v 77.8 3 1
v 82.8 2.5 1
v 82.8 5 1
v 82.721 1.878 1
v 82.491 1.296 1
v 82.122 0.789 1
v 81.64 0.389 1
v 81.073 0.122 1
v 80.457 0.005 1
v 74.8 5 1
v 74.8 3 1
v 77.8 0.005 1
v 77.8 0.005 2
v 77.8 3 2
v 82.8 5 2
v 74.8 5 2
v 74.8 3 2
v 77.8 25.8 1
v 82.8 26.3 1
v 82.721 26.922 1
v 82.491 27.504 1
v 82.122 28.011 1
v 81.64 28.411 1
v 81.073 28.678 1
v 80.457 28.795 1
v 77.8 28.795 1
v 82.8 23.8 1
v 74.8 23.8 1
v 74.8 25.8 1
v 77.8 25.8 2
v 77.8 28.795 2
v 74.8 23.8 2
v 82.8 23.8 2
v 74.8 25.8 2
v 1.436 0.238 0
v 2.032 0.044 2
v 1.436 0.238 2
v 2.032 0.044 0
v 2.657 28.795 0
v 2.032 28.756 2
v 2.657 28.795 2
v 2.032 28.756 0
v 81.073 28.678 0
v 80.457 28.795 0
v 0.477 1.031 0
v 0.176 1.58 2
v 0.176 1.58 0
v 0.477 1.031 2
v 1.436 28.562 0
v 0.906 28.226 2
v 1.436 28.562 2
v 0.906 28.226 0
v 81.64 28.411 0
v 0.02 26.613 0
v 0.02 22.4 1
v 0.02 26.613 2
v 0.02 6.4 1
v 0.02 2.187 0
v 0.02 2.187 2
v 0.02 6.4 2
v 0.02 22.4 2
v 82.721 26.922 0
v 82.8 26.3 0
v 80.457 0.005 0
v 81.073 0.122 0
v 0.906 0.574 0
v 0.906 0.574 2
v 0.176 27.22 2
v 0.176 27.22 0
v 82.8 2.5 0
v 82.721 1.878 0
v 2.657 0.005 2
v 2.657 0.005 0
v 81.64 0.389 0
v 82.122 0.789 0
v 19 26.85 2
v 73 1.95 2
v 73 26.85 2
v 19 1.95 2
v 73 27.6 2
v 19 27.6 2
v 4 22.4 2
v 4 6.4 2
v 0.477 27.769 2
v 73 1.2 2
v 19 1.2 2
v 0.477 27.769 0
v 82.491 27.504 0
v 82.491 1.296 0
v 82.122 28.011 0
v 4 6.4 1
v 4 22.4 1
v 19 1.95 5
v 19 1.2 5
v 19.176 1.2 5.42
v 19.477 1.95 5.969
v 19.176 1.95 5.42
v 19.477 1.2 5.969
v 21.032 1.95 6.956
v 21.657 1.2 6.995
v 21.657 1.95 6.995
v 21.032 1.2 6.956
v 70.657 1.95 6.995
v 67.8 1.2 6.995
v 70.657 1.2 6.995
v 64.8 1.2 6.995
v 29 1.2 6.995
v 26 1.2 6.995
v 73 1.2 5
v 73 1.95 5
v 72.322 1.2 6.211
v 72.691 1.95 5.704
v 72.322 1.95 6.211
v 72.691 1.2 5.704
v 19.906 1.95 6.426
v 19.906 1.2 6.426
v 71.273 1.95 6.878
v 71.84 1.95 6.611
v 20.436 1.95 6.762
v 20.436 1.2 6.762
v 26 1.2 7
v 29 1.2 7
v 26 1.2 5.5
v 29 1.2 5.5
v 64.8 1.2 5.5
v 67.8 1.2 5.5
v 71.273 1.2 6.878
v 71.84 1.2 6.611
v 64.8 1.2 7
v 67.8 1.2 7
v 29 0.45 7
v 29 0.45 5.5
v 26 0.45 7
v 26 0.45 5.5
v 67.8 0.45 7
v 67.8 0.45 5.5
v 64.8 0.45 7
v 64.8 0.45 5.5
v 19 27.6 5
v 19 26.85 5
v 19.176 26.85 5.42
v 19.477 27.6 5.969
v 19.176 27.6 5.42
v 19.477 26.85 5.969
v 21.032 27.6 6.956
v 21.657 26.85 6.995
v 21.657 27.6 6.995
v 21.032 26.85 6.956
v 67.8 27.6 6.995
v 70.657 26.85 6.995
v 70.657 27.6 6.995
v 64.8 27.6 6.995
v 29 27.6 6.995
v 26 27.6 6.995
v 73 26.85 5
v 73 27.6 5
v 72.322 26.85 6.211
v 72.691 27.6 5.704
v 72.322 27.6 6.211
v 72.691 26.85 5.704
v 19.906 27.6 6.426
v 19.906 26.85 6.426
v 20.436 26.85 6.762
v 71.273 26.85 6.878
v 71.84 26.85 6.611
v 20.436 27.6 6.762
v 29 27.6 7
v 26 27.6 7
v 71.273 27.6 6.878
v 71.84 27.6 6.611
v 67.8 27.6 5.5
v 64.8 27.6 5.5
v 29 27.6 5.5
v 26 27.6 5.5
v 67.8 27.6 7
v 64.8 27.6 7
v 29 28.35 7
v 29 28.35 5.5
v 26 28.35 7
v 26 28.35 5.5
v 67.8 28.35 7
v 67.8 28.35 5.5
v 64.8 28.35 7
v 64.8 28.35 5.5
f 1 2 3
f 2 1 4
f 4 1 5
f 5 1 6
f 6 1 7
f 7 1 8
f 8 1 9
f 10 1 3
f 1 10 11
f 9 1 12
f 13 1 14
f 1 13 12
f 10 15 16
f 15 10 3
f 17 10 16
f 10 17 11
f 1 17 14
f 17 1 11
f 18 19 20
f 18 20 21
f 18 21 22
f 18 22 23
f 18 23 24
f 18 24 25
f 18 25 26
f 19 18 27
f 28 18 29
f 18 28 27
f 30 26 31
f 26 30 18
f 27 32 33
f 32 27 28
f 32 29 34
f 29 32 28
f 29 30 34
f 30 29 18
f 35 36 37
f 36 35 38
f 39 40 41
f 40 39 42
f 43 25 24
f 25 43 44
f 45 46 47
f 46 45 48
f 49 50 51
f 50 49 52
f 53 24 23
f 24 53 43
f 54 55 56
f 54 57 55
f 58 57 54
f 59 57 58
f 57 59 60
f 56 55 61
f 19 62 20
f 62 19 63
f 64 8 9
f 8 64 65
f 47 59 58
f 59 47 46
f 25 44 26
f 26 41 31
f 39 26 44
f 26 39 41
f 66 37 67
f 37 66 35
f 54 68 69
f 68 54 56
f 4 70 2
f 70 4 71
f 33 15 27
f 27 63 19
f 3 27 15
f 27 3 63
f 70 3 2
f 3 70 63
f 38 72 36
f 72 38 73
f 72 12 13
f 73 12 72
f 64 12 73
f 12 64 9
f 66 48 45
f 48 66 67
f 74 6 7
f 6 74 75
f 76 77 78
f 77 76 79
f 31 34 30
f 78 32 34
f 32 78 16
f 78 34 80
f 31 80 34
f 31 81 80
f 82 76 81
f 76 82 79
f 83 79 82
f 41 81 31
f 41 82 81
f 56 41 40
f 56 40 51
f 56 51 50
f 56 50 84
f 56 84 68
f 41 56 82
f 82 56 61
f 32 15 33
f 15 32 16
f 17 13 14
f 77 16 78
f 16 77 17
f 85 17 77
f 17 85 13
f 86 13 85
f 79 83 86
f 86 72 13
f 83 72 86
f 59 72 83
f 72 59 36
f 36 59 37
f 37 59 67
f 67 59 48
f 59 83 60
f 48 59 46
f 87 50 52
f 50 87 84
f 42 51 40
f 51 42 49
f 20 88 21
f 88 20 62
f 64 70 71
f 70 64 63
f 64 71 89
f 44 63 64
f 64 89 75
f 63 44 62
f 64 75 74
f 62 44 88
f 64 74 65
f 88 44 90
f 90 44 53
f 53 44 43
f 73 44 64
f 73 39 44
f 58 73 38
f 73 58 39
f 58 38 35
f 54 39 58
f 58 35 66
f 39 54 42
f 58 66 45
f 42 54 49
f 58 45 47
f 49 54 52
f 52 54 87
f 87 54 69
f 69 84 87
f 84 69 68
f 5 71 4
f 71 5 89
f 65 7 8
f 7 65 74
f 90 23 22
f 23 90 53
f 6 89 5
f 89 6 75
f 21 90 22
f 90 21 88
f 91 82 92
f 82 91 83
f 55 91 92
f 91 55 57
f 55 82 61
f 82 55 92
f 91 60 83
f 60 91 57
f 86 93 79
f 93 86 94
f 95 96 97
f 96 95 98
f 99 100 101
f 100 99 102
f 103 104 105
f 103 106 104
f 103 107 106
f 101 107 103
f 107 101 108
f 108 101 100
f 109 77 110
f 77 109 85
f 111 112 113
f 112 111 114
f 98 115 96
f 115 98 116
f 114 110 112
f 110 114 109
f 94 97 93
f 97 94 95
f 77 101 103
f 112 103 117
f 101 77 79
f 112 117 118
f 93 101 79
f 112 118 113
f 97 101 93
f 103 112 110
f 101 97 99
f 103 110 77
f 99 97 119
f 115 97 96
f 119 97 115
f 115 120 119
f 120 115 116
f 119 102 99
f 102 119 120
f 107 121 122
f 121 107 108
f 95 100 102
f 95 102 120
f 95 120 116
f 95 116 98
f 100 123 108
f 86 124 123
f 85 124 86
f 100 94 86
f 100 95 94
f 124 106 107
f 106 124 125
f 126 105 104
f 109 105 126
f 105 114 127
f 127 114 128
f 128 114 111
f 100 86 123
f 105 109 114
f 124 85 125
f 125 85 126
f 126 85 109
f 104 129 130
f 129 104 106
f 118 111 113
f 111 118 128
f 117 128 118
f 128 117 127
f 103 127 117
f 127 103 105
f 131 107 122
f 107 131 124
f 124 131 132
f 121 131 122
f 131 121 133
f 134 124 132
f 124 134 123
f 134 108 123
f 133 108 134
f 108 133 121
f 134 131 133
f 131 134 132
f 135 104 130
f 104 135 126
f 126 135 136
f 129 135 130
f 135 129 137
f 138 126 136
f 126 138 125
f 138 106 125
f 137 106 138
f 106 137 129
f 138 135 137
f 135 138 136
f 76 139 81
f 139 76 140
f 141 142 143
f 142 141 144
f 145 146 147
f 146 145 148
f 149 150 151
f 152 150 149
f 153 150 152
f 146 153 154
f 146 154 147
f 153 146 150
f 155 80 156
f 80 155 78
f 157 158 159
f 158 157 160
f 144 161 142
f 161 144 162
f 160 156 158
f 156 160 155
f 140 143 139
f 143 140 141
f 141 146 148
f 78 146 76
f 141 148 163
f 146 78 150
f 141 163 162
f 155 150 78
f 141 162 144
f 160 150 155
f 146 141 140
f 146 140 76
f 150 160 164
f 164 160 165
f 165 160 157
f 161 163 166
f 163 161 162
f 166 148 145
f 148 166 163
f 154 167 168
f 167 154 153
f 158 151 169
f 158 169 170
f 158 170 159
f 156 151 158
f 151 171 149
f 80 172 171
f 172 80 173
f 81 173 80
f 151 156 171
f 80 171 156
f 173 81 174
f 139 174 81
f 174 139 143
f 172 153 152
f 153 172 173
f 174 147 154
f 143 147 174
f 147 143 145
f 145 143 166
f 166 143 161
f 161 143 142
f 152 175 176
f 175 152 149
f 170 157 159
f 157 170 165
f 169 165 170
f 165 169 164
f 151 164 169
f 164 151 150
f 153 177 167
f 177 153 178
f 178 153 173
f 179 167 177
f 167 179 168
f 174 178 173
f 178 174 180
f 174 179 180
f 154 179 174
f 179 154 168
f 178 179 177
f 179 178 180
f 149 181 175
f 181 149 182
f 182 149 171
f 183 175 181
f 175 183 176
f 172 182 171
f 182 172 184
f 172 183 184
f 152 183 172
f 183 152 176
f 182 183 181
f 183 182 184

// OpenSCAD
// Sureflap battery lid
// (c) 2022 Michiel Fokke <michiel@fokke.org>
// License: CC BY-SA 2.0
// https://creativecommons.org/licenses/by-sa/2.0/legalcode

$fn = 25;

lid_width = 82.8;
lid_height = 28.8;
lid_depth = 2;
lid_radius = 2.5;

left_cutout_width = 4;
left_cutout_height = 16;
left_cutout_depth = 1;

right_cutout_width_1 = 5;
right_cutout_width_2 = 8;
right_cutout_height_1 = 5;
right_cutout_height_2 = 2;
right_cutout_depth = 1;

middle_cutout_width = 5;
middle_cutout_height = 1.5;
middle_cutout_depth = lid_depth;

stand_width = 54;
stand_height = .75;
stand_depth = 7;
stand_radius = 2.5;

stand_x = 19;
stand_y = 1.2;
stand_z = 0;

hook_width = 3;
hook_height = .75;
hook_depth = 1.5;

hook_1_x = 26;
hook_2_x = lid_width - 18;

// Tolerance
t = .1;

module base_plate() {
    hull() {
        for (x = [0, lid_width - 2*lid_radius]) {
            for (y = [0, lid_height - 2* lid_radius]) {
                translate([x + lid_radius, y + lid_radius, 0])
                    cylinder(r=lid_radius, h=lid_depth);
            }
        }
    }
}

module stand_base() {
    translate([0, stand_height, 0])
        rotate([90, 0, 0])
            hull() {
                for (x = [0, stand_width - 2*stand_radius]) {
                    for (y = [0, stand_depth - 2* stand_radius]) {
                        translate([x, y, 0])
                        if (y==0) {
                                cube([stand_radius*2, stand_radius*2, stand_height]);
                            } else {
                                translate([stand_radius,stand_radius, 0])
                                    cylinder(r=stand_radius, h=stand_height);
                            }
                    }
                }
            }
}

module hook(hook_height) {
    cube([hook_width, hook_height, hook_depth]);
}

module stand() {
    union() {
        stand_base();
        translate([hook_1_x - stand_x, -hook_height, stand_depth - hook_depth])
            hook(hook_height);
        translate([hook_2_x - stand_x, -hook_height, stand_depth - hook_depth])
            hook(hook_height);
    }
}

module mirrored_stand() {
    translate([0, stand_height, 0])
    mirror([0, 1 , 0]) { 
            stand();
    }
}

module left_cutout() {
    translate([-t, (lid_height - left_cutout_height)/2, lid_depth - left_cutout_depth])
        cube([left_cutout_width + t, left_cutout_height, left_cutout_depth + t]);
}

module right_cutout() {
// Bottom cutout
    translate([lid_width - right_cutout_width_1, -t, lid_depth - left_cutout_depth])
        cube([right_cutout_width_1 + t, right_cutout_height_1 + t, right_cutout_depth + t]);
    translate([lid_width - right_cutout_width_2, right_cutout_height_1 - right_cutout_height_2, lid_depth - left_cutout_depth])
        cube([right_cutout_width_2 + t, right_cutout_height_2, right_cutout_depth + t]);
// Top cutout
    translate([lid_width - right_cutout_width_1, lid_height - right_cutout_height_1, lid_depth - left_cutout_depth])
        cube([right_cutout_width_1 + t, right_cutout_height_1 + t, right_cutout_depth + t]);
    translate([lid_width - right_cutout_width_2, lid_height - right_cutout_height_1, lid_depth - left_cutout_depth])
        cube([right_cutout_width_2 + t, right_cutout_height_2, right_cutout_depth + t]);

}

module middle_cutout() {
    translate([(lid_width - middle_cutout_width)/2, lid_height - middle_cutout_height, -t])
        cube([middle_cutout_width, middle_cutout_height + t, middle_cutout_depth + 2*t]);
}

module lid_base() {
    difference() {
        base_plate();
        left_cutout();
        right_cutout();
        // middle_cutout();
    }
}

module lid() {
    union() {
        lid_base();
        translate([stand_x, stand_y, stand_z])
            stand();
        translate([stand_x, lid_height - (stand_y + stand_height), stand_z])
            mirrored_stand();
    }
}

lid();
//mirrored_stand();
